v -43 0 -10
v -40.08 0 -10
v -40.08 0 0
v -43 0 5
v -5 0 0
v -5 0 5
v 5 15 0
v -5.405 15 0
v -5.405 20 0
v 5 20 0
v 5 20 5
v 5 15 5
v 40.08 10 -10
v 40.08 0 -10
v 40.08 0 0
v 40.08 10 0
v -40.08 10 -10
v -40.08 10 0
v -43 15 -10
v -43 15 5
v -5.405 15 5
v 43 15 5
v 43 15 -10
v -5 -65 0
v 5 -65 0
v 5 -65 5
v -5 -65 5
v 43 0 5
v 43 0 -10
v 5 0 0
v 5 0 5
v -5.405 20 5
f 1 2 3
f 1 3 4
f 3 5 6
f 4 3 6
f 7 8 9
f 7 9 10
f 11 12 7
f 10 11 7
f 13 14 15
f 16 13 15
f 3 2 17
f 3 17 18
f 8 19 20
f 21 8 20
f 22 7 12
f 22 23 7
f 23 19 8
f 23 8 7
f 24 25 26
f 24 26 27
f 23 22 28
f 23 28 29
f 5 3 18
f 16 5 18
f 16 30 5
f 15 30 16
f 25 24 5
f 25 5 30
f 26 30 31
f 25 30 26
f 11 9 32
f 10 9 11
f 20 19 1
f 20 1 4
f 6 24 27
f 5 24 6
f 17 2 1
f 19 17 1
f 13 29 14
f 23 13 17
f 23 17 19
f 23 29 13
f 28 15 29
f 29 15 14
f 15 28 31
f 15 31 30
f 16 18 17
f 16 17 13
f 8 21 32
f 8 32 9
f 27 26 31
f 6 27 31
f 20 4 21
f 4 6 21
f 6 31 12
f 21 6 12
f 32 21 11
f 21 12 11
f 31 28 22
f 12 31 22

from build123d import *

# Parameters (mm, degrees)
BOSS_EXTRUDE1_DEPTH = 5
SKETCH2_W           = 80
SKETCH2_H           = 15
BOSS_EXTRUDE2_DEPTH = 5
SKETCH3_W           = 15
SKETCH3_H           = 15
BOSS_EXTRUDE3_DEPTH = 3
SKETCH4_W           = 15
SKETCH4_H           = 15
BOSS_EXTRUDE4_DEPTH = 3
SKETCH5_W           = 0.08
SKETCH5_H           = 10
CUT_EXTRUDE1_DEPTH  = 10
SKETCH6_W           = 10.40455395
SKETCH6_H           = 5
BOSS_EXTRUDE5_DEPTH = 5


with BuildPart() as part:
    # Sketch1 → Boss-Extrude1 (new body)
    with BuildSketch(Plane.XY):
        Polygon((-40, 10), (40, 10), (40, 0), (5, 0), (5, -65), (-5, -65), (-5, 0), (-40, 0), align=None)
    extrude(amount=BOSS_EXTRUDE1_DEPTH)

    # Sketch2 → Boss-Extrude2 (add)
    with BuildSketch(Plane(origin=(0, 10, 0), x_dir=(1, 0, 0), z_dir=(0, 1, 0))):
        with Locations((0, 2.5)):
            Rectangle(SKETCH2_W, SKETCH2_H)
    extrude(amount=BOSS_EXTRUDE2_DEPTH)

    # Sketch3 → Boss-Extrude3 (add)
    with BuildSketch(Plane(origin=(40, 0, 0), x_dir=(0, 0, -1), z_dir=(1, 0, 0))):
        with Locations((2.5, 7.5)):
            Rectangle(SKETCH3_W, SKETCH3_H)
    extrude(amount=BOSS_EXTRUDE3_DEPTH)

    # Sketch4 → Boss-Extrude4 (add)
    with BuildSketch(Plane.ZY.offset(40)):
        with Locations((-2.5, 7.5)):
            Rectangle(SKETCH4_W, SKETCH4_H)
    extrude(amount=BOSS_EXTRUDE4_DEPTH)

    # Sketch5 → Cut-Extrude1 (cut)
    with BuildSketch(Plane.XZ):
        with Locations((-40.04, -5)):
            Rectangle(SKETCH5_W, SKETCH5_H)
        with Locations((40.04, -5)):
            Rectangle(SKETCH5_W, SKETCH5_H)
    extrude(amount=-CUT_EXTRUDE1_DEPTH, mode=Mode.SUBTRACT)

    # Sketch6 → Boss-Extrude5 (add)
    with BuildSketch(Plane(origin=(0, 15, 0), x_dir=(1, 0, 0), z_dir=(0, 1, 0))):
        with Locations((-0.202276975, -2.5)):
            Rectangle(SKETCH6_W, SKETCH6_H)
    extrude(amount=BOSS_EXTRUDE5_DEPTH)


solid = part.part
